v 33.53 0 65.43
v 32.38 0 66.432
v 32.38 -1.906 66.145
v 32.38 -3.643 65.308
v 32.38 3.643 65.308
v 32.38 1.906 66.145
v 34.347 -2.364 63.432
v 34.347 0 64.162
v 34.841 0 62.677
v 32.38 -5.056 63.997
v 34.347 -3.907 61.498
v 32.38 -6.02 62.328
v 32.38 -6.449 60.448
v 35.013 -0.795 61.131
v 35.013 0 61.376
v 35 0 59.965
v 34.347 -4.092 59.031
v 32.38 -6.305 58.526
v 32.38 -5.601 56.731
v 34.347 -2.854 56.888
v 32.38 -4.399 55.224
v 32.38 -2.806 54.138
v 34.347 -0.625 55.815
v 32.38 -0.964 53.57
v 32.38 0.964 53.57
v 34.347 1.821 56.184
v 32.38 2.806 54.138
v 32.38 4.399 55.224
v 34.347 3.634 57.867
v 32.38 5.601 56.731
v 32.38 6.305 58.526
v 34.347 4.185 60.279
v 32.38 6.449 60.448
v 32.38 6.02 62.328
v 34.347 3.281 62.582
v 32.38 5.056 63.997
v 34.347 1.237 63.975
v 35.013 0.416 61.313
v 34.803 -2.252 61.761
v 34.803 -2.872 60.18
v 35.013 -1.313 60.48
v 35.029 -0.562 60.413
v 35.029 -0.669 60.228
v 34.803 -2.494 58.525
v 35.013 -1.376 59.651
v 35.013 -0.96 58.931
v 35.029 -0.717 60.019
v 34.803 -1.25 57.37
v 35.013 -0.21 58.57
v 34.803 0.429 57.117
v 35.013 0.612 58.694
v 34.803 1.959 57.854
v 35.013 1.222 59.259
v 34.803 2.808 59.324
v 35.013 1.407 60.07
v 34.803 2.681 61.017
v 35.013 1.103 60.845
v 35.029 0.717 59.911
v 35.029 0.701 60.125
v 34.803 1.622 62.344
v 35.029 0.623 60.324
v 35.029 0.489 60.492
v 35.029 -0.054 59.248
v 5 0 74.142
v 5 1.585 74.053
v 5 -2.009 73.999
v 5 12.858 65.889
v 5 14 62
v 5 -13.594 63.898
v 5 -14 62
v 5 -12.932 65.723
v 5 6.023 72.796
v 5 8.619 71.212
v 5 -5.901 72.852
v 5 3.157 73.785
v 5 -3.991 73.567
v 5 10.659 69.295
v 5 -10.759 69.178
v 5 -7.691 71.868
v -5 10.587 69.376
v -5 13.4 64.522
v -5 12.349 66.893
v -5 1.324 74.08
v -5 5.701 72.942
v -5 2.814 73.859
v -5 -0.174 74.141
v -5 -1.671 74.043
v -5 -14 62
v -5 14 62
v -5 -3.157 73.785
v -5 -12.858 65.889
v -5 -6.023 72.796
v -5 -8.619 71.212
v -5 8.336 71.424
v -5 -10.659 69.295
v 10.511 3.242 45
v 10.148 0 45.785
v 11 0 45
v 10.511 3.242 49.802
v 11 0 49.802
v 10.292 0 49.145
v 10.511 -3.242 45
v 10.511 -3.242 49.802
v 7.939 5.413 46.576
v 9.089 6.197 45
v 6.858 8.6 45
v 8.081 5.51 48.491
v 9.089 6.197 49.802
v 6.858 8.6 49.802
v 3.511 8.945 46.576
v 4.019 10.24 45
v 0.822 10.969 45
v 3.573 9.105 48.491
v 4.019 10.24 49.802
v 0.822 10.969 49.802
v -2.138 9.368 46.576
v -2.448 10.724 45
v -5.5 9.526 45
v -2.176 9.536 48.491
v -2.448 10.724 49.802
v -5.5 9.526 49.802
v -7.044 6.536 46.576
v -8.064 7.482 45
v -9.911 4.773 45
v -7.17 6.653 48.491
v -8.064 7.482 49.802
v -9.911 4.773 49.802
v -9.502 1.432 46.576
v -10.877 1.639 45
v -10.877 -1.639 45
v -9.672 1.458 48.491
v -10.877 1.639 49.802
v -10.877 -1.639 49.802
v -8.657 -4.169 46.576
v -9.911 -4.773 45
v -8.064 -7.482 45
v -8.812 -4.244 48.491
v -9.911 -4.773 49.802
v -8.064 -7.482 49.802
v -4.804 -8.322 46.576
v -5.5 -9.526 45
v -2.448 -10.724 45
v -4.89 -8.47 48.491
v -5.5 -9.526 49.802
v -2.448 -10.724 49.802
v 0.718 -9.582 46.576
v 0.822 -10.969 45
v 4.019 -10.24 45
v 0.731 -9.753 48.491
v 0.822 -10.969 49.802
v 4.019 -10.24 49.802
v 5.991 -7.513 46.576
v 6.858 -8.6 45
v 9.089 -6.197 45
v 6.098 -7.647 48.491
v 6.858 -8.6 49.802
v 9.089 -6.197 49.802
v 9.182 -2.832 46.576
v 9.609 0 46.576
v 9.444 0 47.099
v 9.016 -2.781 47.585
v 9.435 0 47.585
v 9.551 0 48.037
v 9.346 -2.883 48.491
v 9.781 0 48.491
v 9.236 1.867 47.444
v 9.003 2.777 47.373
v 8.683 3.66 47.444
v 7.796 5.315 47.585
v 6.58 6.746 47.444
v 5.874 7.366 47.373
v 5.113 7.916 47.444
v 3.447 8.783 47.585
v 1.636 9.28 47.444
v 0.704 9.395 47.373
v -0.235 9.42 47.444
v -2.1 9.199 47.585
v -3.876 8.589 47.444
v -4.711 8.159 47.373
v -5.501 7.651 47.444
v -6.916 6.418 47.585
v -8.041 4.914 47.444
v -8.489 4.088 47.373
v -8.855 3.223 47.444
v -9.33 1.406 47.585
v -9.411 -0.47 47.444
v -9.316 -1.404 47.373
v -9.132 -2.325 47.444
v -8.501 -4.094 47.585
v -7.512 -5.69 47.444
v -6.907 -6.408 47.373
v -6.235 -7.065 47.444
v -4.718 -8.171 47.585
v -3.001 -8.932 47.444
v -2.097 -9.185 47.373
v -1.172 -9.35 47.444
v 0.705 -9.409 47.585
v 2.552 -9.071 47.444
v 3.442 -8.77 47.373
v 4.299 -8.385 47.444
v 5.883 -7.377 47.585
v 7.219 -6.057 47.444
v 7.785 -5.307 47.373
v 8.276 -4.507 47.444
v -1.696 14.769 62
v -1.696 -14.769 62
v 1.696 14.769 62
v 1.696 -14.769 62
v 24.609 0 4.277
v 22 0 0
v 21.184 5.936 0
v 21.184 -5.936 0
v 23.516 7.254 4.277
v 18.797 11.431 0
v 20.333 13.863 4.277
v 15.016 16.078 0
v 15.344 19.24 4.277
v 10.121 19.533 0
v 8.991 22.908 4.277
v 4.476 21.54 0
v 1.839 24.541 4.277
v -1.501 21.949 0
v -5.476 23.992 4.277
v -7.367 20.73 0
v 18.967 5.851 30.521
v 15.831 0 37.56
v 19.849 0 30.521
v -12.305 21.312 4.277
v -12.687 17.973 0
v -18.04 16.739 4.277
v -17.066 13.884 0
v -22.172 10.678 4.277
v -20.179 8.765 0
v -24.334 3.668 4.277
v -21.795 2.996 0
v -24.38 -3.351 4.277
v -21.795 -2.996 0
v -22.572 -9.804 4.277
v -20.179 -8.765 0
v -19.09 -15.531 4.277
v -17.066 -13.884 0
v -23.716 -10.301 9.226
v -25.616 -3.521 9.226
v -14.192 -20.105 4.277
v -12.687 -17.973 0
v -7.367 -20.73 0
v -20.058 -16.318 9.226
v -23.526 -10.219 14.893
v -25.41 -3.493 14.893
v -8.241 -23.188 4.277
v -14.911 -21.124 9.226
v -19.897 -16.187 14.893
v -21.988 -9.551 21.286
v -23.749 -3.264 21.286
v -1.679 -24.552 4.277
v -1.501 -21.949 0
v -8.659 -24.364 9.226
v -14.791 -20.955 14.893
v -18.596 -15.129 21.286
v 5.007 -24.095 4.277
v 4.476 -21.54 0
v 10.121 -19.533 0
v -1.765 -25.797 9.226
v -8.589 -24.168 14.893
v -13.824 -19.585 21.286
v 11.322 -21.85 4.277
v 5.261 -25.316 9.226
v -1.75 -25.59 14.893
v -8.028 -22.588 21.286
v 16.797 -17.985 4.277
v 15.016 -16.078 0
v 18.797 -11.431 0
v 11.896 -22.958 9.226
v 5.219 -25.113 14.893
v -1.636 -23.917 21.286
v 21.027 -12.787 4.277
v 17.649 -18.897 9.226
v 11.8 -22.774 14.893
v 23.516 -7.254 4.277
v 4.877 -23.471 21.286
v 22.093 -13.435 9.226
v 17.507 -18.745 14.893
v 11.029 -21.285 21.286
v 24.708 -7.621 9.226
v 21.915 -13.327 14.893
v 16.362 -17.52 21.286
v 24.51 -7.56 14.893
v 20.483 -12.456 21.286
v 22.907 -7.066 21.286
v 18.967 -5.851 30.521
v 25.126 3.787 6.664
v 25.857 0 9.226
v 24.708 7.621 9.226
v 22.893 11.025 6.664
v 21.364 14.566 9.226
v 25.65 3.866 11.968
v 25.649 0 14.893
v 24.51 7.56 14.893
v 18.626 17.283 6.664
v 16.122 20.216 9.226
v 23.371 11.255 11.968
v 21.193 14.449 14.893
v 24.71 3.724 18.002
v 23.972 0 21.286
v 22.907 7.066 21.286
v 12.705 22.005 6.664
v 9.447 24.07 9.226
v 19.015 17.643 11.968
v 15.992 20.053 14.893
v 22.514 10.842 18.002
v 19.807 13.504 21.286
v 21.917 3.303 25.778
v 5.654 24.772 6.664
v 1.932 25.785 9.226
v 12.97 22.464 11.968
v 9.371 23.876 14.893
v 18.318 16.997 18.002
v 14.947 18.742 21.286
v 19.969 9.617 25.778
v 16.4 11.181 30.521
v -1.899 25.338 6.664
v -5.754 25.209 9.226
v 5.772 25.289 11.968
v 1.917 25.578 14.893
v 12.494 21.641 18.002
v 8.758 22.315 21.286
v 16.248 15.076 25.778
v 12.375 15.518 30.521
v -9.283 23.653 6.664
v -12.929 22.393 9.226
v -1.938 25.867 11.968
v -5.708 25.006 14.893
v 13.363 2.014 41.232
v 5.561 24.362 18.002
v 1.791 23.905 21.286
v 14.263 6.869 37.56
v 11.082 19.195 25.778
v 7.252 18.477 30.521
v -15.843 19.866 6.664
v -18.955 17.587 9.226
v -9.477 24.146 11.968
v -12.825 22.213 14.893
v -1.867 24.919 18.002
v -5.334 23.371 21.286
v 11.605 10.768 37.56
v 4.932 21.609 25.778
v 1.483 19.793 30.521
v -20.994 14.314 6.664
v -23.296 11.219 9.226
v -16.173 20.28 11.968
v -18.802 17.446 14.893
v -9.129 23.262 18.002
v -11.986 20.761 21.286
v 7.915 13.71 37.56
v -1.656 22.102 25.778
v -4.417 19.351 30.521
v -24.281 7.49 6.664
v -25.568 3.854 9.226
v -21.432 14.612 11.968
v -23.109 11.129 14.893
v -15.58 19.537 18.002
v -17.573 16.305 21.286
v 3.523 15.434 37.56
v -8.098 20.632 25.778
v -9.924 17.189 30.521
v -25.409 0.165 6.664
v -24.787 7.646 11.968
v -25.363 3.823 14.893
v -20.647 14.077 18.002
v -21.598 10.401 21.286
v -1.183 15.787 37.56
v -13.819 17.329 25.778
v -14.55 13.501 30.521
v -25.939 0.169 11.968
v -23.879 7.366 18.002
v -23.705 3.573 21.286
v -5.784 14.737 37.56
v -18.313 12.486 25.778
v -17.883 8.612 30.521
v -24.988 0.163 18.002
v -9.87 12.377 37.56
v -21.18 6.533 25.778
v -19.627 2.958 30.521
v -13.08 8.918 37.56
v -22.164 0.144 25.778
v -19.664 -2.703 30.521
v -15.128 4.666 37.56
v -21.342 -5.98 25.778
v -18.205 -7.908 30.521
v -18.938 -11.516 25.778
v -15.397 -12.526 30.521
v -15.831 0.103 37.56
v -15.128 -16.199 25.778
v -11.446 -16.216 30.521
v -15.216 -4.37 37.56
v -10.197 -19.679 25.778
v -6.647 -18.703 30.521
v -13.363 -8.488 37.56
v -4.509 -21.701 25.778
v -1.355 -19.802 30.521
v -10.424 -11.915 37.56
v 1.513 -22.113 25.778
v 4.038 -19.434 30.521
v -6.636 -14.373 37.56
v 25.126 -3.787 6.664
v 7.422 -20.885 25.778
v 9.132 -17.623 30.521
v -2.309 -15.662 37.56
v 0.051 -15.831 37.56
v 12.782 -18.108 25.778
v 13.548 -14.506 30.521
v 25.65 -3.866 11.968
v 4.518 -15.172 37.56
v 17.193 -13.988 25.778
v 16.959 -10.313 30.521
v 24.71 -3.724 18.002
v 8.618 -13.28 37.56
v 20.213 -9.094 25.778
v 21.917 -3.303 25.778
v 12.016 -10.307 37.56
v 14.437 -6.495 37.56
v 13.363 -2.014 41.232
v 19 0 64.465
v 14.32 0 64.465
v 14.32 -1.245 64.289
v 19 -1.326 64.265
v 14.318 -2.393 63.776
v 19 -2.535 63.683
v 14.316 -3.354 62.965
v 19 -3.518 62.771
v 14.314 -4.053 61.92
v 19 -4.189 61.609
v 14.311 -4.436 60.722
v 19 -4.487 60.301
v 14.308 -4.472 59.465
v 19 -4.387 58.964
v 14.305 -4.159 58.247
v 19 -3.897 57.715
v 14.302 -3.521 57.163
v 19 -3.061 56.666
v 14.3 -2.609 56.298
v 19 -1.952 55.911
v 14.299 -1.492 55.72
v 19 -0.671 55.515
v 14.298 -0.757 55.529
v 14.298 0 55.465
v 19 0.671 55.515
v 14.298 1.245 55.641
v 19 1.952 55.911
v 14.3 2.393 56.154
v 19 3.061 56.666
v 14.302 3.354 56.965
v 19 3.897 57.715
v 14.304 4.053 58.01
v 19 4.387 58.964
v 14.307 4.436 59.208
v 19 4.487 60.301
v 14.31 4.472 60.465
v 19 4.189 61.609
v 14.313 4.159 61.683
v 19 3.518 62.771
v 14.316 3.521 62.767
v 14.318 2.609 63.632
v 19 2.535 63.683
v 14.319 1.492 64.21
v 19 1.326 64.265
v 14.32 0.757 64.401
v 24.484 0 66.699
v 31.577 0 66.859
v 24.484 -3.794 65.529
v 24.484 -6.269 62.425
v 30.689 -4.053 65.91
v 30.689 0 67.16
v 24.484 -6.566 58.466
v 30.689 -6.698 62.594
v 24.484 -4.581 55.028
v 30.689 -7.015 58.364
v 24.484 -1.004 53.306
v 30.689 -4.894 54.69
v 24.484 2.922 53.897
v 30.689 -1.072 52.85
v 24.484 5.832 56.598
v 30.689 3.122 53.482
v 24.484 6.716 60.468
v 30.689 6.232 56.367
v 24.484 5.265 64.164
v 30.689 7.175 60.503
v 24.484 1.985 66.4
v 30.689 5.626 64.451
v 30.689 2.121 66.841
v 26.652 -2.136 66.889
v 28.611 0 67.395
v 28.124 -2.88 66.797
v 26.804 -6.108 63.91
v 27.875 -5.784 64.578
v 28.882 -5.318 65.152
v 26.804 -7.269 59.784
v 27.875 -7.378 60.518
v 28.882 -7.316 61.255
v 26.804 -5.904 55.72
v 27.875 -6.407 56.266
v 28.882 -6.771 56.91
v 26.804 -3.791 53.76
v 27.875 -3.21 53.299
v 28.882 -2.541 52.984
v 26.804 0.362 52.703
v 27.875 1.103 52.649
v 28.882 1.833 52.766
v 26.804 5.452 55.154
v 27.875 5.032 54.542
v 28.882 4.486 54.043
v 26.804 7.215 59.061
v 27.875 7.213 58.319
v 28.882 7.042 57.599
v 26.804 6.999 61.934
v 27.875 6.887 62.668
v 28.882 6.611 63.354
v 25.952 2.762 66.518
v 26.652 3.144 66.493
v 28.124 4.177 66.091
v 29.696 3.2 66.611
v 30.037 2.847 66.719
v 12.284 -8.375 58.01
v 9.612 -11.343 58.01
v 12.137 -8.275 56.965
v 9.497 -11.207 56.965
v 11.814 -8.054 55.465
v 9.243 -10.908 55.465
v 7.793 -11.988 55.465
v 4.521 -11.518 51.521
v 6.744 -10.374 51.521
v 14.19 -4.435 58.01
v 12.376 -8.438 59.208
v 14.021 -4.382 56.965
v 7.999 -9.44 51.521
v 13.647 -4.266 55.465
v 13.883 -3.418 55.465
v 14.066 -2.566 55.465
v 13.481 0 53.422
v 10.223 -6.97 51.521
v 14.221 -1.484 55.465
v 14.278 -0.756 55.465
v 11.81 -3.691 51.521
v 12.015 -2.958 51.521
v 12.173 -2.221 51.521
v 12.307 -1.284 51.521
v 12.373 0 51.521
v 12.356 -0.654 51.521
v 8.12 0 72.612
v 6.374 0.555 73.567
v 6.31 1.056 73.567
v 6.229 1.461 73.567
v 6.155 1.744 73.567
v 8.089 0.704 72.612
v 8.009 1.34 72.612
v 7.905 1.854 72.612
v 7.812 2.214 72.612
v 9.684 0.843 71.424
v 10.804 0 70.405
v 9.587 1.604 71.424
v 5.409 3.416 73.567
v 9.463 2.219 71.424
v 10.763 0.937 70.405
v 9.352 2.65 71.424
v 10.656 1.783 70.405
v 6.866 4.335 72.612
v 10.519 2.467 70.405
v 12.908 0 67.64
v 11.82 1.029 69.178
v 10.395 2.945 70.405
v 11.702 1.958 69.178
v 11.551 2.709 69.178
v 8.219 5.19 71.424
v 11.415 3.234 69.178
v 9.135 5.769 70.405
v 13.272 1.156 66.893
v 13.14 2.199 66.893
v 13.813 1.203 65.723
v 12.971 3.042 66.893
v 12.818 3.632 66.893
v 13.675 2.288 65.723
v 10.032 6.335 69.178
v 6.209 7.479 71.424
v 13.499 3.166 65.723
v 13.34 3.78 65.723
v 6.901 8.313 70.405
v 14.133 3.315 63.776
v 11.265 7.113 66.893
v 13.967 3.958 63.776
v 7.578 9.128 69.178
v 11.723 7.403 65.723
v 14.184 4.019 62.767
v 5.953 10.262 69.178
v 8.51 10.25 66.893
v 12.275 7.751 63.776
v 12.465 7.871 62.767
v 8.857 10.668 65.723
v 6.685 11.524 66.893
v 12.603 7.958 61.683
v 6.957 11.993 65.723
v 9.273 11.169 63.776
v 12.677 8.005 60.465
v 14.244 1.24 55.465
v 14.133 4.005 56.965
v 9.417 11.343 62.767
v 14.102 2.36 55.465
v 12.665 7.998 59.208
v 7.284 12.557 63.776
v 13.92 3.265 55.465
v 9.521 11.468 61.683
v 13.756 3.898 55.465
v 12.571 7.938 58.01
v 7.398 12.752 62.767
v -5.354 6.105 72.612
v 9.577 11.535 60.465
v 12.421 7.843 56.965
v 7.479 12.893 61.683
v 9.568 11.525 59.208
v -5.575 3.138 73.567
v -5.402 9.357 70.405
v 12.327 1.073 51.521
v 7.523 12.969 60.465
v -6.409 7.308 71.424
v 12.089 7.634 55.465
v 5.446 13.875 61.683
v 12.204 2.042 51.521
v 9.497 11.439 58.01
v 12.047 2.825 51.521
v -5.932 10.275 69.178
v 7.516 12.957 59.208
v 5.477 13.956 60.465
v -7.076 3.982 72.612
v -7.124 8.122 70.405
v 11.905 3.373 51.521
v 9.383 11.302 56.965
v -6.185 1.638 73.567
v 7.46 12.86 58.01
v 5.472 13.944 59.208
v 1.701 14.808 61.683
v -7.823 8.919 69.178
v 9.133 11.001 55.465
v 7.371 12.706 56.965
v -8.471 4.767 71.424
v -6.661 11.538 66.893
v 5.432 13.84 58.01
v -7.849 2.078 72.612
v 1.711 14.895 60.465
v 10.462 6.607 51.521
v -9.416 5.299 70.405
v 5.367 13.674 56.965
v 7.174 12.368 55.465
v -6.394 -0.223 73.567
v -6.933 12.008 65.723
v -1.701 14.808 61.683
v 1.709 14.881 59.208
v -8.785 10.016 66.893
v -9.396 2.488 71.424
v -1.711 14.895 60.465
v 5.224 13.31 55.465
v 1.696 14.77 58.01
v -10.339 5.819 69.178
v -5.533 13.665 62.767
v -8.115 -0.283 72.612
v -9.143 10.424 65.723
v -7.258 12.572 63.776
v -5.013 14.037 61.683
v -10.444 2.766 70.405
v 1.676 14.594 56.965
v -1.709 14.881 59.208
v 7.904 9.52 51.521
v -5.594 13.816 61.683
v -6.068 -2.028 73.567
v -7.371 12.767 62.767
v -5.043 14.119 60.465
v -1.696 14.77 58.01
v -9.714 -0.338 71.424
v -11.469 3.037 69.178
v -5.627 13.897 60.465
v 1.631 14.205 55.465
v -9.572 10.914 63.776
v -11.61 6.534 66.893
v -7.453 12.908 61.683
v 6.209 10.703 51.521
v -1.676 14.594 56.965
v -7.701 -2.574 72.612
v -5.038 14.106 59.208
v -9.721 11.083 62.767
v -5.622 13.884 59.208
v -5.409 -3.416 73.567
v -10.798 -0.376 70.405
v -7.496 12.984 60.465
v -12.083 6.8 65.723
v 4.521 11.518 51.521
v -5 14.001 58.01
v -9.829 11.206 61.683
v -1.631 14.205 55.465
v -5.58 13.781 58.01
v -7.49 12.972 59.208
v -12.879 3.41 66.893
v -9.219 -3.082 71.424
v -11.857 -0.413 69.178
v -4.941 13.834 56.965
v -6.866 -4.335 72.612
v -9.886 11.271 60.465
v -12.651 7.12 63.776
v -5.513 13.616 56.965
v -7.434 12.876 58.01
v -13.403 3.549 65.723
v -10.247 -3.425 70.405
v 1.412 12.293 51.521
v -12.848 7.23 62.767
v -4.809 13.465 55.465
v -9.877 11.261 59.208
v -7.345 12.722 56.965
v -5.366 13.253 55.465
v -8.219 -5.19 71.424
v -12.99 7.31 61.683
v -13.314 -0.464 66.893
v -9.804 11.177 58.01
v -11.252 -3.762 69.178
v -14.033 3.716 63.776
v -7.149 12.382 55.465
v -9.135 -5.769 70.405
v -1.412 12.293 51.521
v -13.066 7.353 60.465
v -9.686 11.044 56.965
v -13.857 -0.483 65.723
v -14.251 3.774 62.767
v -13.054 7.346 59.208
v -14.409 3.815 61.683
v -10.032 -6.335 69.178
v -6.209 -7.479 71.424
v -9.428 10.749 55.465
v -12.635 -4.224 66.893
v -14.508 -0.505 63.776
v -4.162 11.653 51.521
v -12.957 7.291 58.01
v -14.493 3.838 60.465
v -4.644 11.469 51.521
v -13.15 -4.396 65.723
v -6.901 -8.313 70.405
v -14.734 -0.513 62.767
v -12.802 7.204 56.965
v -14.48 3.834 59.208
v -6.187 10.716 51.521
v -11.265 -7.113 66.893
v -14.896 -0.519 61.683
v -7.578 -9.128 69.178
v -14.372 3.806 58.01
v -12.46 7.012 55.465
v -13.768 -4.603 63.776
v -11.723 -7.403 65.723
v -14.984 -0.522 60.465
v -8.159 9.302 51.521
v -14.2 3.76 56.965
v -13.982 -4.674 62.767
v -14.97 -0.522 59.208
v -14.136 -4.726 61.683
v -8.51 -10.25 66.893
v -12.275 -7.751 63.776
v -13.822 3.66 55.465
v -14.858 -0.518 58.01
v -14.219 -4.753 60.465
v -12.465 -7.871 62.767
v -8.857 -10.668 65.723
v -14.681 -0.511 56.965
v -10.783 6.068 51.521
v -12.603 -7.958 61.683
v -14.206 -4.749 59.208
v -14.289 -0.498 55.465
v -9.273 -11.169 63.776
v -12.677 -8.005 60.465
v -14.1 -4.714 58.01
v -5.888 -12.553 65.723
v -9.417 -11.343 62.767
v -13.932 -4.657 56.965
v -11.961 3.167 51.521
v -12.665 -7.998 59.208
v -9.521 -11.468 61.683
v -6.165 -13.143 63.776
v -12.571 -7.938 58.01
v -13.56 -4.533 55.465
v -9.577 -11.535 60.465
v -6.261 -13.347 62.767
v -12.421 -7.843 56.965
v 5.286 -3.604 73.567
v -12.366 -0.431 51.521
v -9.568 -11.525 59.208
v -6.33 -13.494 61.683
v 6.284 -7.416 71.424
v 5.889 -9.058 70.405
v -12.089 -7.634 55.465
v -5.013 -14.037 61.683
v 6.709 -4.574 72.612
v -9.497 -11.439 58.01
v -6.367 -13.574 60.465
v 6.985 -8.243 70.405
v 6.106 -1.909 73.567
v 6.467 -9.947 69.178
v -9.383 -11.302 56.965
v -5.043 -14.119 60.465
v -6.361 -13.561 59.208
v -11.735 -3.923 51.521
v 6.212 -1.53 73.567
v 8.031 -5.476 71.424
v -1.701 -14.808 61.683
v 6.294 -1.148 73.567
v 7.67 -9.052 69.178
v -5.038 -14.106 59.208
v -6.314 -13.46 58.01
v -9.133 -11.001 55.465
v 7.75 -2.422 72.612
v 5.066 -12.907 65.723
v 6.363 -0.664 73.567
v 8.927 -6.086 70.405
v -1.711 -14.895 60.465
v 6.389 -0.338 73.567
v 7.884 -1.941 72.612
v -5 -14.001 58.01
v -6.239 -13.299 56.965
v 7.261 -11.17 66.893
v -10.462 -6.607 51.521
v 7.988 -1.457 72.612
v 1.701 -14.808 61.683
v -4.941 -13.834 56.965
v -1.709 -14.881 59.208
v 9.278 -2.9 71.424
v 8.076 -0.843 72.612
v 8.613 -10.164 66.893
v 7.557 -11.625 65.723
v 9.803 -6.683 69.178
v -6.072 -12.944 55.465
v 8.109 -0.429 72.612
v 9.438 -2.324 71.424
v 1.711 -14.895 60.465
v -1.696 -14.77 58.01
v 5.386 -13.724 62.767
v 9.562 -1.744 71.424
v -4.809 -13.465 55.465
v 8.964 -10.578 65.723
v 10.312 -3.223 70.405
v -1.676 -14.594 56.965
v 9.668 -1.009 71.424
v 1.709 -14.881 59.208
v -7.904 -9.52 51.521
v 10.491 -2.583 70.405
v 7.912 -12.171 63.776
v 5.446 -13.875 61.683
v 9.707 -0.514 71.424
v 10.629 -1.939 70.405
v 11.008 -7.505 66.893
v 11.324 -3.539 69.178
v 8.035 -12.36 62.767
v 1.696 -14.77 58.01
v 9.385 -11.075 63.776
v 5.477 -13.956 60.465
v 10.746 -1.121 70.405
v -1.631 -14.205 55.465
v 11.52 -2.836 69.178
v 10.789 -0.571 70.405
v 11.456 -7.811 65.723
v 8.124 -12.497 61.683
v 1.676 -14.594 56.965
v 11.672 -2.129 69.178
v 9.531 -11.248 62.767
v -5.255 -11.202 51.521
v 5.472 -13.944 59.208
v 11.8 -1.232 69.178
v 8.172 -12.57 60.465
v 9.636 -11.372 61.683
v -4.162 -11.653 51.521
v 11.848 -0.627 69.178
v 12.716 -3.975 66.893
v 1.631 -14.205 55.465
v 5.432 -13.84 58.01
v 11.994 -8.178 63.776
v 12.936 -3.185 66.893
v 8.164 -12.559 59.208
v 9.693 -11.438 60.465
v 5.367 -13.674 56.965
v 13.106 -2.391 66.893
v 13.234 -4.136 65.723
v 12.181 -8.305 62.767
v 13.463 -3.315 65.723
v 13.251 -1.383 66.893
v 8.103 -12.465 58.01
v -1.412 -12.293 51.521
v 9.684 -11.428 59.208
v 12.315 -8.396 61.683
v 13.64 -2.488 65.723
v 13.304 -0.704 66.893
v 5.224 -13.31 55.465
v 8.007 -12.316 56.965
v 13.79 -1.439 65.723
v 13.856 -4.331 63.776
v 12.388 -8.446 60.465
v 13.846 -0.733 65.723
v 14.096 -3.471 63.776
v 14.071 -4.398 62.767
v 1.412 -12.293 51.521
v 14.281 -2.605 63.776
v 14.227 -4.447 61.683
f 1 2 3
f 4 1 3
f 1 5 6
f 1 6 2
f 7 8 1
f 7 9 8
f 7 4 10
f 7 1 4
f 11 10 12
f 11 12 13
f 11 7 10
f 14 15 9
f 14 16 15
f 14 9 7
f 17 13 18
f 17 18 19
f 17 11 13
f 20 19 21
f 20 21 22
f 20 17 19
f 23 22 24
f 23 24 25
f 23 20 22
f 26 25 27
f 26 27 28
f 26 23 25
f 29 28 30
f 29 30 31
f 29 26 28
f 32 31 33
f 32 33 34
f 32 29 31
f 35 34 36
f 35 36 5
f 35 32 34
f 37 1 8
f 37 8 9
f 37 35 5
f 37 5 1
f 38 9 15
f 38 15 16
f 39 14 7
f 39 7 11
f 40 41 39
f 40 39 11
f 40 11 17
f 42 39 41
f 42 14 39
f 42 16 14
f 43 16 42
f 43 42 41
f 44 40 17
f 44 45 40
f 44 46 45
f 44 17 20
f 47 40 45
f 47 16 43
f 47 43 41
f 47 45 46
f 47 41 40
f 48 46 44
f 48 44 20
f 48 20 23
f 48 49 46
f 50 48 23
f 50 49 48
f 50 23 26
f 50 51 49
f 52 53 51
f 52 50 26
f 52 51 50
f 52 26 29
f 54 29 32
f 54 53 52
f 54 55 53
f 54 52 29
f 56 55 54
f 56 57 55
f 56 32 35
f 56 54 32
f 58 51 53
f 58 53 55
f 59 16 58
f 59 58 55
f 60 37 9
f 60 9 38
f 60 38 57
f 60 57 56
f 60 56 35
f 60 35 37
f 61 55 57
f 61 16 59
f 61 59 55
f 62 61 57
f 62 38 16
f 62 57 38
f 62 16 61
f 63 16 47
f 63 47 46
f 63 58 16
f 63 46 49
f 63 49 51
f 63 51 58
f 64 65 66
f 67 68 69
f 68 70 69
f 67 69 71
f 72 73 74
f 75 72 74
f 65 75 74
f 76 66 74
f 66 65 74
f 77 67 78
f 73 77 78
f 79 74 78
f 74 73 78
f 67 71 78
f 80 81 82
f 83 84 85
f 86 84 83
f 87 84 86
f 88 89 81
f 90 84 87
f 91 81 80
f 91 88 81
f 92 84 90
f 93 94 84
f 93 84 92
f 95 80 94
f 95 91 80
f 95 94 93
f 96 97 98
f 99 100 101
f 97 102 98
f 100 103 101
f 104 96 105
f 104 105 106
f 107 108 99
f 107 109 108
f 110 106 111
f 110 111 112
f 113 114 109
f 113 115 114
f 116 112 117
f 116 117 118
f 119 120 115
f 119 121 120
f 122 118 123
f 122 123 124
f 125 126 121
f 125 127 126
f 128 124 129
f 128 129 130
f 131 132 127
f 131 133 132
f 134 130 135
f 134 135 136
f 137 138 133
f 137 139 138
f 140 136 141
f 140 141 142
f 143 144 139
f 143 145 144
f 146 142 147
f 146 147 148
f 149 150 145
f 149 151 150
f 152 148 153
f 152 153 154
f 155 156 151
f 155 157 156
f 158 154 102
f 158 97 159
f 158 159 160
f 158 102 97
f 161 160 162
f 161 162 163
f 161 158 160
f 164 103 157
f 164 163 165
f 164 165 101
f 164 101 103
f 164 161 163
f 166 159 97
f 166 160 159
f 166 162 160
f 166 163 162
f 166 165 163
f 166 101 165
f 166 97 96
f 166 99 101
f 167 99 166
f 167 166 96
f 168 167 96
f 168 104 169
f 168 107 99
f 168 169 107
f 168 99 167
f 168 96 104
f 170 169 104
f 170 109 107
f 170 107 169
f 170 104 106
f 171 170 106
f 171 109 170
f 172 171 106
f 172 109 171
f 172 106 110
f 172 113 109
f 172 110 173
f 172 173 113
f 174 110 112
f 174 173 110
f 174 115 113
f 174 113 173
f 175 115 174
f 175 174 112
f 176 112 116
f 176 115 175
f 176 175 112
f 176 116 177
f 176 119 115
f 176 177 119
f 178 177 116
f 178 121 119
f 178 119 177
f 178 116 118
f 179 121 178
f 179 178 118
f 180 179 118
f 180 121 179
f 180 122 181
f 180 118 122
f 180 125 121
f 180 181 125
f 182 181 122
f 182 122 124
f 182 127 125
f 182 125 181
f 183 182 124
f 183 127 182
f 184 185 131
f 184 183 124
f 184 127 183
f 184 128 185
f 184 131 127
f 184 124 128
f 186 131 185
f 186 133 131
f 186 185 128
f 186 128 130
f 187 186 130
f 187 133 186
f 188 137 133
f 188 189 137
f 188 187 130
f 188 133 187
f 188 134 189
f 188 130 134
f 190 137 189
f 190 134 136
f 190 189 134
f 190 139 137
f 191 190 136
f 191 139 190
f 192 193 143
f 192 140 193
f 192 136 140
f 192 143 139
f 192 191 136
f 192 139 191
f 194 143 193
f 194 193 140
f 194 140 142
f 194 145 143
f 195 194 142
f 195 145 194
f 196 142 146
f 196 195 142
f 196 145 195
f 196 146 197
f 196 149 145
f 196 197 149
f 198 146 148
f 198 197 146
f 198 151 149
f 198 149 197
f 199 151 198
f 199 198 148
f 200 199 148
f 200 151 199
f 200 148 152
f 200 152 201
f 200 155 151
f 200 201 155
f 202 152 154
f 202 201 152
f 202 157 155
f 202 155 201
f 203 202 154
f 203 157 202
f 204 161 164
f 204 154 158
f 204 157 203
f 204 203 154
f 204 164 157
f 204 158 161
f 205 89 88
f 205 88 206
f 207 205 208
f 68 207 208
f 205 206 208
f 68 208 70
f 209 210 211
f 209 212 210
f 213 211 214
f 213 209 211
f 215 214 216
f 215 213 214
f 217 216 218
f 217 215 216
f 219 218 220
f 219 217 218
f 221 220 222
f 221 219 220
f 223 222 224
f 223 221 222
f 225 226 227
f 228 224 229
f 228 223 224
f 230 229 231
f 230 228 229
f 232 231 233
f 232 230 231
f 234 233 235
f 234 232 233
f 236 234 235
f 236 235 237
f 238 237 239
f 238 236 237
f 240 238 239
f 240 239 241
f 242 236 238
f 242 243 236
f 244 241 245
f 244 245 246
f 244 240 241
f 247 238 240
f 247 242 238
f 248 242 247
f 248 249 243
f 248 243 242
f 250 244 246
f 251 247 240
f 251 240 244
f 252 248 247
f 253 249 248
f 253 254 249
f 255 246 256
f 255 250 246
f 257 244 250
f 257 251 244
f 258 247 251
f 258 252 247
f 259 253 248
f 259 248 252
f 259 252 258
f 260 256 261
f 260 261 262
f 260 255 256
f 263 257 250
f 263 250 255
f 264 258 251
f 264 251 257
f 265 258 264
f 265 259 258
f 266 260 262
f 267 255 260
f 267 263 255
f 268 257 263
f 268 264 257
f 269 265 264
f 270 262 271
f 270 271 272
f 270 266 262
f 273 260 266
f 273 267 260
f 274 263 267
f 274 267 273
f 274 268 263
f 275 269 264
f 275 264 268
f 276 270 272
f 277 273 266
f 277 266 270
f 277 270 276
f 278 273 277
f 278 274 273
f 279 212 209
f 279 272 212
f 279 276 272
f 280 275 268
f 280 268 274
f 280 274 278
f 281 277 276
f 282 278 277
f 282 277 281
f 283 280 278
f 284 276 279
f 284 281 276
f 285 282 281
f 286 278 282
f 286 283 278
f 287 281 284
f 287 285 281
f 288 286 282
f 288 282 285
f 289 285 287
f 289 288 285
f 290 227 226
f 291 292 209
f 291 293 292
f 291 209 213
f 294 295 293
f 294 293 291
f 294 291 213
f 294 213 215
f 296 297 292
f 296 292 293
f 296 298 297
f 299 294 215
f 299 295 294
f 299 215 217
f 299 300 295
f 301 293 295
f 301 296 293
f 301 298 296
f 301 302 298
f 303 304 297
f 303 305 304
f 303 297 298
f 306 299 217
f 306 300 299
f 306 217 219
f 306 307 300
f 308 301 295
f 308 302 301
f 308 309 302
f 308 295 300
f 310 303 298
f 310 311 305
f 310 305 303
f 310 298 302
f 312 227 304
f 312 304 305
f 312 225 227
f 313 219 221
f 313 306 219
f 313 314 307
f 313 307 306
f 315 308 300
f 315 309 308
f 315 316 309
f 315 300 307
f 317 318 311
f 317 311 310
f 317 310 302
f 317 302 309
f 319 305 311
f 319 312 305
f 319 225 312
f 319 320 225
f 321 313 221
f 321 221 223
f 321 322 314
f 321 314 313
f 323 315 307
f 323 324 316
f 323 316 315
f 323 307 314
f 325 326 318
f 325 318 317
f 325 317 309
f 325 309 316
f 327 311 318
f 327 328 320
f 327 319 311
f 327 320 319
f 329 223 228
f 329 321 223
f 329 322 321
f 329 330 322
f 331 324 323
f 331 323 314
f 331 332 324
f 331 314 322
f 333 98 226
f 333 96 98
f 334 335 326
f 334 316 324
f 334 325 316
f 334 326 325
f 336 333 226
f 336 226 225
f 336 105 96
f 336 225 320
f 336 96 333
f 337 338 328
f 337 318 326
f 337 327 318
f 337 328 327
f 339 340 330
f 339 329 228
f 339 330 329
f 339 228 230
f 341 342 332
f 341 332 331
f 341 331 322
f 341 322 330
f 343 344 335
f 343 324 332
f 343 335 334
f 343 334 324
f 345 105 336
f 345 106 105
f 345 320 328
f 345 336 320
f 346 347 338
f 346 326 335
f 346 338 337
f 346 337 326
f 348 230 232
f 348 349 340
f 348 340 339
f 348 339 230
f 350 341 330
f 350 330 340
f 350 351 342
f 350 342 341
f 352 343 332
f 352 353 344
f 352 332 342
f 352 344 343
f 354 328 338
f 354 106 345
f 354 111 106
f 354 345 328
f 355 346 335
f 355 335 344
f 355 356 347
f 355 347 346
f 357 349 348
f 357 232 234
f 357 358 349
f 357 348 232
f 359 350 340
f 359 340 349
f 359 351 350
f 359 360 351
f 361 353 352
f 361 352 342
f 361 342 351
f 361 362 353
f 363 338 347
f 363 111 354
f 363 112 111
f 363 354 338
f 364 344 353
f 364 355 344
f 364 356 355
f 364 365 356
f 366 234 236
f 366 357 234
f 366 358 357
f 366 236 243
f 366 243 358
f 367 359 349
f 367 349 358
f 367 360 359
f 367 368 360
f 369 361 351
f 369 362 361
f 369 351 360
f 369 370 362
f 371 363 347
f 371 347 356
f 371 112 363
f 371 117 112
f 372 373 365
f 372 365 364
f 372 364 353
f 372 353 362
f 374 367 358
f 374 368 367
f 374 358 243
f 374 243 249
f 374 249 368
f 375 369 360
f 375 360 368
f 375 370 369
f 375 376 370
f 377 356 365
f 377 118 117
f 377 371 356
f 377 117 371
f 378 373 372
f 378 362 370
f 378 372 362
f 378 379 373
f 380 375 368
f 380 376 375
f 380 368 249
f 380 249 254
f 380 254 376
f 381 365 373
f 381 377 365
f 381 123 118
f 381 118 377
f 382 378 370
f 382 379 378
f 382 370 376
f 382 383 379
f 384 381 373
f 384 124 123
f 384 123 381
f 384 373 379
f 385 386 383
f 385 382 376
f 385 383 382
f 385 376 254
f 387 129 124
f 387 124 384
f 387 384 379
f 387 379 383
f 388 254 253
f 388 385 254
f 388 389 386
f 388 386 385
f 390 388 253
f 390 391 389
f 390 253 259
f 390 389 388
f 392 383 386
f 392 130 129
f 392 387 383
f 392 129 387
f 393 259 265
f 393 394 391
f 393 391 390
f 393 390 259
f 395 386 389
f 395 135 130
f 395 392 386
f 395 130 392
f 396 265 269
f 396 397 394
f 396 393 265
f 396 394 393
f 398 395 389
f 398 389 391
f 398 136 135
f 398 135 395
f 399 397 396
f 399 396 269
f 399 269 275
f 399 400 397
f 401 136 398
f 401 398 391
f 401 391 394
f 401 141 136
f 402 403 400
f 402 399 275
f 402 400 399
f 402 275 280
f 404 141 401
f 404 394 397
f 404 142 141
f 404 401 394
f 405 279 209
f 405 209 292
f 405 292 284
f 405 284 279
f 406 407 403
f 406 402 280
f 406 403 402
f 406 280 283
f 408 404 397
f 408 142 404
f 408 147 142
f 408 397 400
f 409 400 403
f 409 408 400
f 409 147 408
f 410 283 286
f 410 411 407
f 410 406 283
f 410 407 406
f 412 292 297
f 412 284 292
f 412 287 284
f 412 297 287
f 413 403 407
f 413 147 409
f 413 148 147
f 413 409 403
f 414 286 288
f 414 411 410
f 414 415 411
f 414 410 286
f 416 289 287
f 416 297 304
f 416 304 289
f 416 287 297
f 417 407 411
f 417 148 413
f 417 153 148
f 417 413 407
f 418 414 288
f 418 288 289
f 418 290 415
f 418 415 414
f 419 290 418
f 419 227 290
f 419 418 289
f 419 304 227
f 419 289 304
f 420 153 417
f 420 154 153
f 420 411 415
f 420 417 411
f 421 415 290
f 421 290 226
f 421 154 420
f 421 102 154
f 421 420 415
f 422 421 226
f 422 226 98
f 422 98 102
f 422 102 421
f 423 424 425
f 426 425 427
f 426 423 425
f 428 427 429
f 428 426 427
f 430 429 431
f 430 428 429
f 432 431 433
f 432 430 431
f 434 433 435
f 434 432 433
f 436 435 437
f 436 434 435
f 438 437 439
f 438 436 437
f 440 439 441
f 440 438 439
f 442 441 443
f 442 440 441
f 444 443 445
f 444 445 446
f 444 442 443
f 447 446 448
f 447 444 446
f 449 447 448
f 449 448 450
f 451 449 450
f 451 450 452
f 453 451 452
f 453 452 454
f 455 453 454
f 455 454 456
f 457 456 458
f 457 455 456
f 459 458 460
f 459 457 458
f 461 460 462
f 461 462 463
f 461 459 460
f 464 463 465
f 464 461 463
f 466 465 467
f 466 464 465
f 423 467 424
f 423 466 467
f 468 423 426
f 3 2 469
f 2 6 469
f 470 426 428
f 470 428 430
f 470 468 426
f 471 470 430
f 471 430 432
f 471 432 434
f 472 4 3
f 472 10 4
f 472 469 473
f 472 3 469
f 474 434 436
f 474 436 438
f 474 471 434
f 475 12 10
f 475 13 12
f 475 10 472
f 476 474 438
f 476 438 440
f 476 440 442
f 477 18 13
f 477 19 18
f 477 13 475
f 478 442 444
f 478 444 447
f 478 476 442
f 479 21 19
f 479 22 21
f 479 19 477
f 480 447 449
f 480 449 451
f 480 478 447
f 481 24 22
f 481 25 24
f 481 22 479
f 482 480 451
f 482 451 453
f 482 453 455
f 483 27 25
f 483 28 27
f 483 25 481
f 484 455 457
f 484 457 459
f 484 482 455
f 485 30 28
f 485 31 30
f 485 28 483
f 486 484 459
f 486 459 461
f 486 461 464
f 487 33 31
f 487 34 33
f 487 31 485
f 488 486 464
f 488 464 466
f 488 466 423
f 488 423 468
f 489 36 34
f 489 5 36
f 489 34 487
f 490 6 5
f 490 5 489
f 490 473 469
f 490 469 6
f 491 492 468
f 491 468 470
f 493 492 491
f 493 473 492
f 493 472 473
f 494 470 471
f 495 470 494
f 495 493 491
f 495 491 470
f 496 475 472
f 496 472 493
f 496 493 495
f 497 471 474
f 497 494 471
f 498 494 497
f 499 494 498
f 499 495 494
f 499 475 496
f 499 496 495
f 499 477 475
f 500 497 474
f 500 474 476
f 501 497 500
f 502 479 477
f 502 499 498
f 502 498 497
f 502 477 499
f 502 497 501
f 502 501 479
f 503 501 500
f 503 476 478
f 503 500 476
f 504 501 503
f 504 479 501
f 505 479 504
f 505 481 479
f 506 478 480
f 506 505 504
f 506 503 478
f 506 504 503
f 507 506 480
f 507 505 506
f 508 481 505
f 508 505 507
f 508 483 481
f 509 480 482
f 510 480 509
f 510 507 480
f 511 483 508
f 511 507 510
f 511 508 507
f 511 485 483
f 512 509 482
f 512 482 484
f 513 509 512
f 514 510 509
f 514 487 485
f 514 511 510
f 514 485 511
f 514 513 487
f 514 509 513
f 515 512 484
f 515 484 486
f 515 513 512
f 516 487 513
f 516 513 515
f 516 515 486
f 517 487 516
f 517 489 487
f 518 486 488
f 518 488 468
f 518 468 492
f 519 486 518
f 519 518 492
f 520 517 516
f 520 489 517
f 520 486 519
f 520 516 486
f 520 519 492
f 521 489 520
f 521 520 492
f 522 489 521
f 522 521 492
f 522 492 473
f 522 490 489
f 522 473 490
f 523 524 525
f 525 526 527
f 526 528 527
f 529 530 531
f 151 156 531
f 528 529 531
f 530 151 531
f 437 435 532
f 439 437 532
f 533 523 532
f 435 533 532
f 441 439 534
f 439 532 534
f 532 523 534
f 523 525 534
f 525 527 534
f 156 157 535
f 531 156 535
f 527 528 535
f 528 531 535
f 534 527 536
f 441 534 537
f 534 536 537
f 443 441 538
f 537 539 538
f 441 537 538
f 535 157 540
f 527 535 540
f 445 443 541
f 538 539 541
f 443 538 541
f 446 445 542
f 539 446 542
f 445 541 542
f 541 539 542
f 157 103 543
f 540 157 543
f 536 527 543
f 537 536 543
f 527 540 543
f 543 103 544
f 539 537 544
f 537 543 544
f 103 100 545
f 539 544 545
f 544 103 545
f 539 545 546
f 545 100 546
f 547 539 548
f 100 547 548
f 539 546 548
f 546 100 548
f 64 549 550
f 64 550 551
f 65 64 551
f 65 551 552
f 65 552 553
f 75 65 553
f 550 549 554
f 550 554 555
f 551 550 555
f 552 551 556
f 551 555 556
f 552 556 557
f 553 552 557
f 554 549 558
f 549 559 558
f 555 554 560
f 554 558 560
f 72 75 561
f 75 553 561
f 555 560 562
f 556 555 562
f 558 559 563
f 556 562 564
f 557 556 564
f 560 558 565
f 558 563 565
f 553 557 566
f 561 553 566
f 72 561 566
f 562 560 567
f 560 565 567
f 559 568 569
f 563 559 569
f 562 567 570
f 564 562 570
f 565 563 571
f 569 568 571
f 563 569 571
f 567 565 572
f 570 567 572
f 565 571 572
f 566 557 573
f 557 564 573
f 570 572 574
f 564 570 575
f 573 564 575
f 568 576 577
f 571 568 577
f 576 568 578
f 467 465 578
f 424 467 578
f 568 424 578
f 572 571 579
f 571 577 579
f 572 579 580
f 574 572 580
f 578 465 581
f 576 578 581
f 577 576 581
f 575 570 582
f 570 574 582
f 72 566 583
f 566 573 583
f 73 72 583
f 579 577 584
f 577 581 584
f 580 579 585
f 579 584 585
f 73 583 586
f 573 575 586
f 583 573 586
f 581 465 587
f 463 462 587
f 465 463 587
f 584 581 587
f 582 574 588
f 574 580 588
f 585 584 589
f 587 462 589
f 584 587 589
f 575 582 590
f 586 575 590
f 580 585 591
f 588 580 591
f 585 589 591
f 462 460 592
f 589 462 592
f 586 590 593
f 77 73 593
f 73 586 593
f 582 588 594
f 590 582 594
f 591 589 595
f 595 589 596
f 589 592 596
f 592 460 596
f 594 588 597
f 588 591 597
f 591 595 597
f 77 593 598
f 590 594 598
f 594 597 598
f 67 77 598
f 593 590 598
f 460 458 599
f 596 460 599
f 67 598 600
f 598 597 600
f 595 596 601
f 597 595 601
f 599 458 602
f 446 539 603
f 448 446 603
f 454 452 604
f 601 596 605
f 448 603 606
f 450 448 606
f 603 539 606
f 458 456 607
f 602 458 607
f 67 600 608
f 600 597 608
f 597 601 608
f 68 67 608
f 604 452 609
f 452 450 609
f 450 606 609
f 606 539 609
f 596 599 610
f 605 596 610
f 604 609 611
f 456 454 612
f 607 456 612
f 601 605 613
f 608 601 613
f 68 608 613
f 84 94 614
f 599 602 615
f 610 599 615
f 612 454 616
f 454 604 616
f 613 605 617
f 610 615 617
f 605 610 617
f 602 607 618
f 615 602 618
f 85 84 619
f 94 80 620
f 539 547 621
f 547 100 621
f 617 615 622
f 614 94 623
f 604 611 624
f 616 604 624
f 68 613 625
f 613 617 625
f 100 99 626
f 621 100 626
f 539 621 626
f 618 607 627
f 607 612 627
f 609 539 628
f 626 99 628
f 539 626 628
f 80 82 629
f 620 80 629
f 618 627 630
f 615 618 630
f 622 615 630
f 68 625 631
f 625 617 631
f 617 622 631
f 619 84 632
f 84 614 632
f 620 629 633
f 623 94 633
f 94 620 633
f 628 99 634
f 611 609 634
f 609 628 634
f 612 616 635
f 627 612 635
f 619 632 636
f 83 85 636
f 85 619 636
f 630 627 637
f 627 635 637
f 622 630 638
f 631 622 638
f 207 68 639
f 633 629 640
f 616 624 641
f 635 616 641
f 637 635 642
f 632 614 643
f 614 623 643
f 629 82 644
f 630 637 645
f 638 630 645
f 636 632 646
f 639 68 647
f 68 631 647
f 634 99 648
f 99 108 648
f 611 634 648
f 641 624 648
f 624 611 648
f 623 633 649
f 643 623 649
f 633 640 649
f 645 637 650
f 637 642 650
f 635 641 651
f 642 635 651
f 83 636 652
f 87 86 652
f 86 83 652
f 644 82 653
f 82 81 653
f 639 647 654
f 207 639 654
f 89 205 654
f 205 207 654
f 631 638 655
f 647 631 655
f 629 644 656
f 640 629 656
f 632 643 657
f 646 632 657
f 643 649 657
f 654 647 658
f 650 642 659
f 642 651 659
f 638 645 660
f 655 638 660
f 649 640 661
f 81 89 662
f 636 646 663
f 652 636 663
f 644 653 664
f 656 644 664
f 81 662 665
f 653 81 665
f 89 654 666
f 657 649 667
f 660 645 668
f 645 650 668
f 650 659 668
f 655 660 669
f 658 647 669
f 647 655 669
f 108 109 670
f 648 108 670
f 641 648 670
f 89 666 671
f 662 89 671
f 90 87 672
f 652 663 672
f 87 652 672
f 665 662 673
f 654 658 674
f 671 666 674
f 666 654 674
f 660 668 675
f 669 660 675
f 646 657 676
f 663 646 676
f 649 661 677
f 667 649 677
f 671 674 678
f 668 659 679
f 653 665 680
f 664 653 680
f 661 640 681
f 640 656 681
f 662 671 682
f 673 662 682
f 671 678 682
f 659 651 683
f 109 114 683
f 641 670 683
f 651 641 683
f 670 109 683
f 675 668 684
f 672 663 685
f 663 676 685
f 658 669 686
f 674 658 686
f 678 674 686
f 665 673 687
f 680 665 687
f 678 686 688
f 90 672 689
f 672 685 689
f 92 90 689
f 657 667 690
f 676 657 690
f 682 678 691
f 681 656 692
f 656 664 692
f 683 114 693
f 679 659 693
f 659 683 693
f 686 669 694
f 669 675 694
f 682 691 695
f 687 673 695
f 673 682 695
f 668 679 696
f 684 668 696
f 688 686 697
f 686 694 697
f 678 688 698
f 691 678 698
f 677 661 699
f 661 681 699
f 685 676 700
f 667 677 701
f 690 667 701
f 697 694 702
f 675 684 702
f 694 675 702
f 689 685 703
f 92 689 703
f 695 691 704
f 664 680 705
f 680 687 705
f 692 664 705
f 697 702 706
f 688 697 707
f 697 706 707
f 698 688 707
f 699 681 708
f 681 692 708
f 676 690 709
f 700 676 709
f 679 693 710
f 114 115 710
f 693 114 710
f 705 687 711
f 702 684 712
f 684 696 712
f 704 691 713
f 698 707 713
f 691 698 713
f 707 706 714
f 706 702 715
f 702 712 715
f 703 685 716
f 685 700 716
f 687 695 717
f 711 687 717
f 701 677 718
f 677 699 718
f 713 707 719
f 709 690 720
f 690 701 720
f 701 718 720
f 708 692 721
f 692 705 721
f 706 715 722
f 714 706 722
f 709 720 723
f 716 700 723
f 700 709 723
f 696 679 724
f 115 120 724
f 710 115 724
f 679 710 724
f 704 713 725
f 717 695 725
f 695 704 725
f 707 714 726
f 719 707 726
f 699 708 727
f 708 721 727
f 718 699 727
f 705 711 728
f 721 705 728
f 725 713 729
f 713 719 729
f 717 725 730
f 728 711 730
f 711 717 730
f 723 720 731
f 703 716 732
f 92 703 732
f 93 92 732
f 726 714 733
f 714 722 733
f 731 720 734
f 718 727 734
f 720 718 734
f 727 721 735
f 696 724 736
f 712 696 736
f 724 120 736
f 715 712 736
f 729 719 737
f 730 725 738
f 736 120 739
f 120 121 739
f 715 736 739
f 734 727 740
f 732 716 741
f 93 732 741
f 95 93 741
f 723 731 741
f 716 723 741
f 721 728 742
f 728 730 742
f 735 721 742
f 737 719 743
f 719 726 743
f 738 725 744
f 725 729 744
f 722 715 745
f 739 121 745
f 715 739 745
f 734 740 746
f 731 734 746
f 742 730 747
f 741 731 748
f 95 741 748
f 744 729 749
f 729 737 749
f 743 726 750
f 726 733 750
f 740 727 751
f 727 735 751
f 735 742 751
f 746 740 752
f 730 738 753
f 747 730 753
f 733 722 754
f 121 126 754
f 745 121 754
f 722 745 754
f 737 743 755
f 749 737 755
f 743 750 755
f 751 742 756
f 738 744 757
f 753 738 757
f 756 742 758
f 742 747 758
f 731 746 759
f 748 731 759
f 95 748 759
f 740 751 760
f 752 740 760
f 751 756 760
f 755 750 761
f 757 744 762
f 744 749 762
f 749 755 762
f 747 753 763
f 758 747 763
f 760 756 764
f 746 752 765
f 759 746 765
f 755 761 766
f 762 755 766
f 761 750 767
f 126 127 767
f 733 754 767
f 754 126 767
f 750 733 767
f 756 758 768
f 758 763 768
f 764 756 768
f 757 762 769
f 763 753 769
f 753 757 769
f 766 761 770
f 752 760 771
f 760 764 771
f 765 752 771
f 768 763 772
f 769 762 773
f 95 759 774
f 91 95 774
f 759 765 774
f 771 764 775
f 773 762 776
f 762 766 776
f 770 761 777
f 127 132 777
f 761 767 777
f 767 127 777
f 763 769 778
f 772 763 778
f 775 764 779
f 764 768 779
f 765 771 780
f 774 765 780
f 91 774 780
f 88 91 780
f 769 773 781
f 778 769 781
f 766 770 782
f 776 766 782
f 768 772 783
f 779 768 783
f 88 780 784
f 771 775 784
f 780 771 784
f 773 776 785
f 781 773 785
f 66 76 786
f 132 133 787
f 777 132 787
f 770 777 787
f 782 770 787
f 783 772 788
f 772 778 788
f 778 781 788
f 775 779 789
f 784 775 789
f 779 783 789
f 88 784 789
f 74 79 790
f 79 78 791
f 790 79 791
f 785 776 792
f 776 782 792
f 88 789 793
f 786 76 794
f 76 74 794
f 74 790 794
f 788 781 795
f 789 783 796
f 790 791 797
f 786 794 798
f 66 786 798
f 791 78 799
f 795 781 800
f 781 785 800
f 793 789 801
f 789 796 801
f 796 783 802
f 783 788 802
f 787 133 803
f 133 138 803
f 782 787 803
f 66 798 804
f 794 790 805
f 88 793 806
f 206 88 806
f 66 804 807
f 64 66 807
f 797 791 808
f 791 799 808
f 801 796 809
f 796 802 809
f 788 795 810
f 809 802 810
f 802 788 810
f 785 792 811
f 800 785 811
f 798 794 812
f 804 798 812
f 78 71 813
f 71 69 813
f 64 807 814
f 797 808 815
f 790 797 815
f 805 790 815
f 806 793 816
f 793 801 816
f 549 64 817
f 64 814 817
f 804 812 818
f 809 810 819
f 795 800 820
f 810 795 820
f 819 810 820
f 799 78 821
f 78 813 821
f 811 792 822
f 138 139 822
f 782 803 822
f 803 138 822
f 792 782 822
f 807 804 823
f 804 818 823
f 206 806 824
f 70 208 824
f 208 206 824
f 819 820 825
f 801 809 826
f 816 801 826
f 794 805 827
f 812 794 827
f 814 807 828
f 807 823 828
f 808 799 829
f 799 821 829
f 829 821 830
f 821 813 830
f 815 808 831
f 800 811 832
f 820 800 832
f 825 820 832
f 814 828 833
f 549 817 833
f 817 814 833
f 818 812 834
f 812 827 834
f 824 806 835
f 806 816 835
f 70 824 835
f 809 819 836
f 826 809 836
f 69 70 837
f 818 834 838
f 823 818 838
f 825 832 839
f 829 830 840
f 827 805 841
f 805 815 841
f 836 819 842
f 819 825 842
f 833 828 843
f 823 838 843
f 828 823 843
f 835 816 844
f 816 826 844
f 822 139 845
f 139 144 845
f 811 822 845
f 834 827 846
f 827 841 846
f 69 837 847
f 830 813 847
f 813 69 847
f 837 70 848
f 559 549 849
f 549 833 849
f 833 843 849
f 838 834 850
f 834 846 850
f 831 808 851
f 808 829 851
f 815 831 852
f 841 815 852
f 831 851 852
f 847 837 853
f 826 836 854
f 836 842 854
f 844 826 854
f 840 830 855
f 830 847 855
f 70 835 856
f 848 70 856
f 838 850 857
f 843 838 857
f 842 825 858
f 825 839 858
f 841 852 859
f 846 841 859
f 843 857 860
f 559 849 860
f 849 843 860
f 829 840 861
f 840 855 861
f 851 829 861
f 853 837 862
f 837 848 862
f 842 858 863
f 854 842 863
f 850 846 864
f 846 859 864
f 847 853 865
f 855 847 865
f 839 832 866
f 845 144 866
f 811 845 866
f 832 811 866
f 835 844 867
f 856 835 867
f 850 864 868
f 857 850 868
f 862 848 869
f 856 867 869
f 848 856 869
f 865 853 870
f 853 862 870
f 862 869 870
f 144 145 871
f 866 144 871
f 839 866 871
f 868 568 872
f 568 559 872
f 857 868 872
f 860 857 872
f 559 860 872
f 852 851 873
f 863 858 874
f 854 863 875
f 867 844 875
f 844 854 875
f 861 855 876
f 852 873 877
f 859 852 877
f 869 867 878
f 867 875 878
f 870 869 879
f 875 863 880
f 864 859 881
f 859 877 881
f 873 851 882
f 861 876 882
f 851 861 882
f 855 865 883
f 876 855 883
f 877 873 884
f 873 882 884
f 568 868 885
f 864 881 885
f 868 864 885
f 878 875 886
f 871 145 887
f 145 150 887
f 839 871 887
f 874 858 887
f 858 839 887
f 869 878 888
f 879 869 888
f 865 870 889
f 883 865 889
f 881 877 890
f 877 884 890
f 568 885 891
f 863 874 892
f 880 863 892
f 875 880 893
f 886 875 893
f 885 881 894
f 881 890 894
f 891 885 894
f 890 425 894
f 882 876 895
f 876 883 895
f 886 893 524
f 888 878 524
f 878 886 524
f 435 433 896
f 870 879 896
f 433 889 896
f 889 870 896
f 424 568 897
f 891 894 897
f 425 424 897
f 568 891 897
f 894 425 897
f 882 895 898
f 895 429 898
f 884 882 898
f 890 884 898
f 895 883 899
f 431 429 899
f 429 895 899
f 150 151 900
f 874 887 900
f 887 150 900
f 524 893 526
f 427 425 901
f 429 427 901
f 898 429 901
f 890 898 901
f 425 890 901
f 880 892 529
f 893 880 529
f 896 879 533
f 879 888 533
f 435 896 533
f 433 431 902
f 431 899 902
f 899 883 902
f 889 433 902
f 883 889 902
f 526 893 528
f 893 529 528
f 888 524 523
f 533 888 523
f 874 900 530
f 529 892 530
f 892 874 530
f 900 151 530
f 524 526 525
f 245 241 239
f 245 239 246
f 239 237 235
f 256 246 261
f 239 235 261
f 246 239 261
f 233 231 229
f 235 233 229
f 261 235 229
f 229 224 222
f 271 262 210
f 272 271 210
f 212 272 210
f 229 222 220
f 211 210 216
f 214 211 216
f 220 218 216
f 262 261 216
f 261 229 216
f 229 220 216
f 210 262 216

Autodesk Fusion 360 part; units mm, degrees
sketch "Skizze1" plane through (0, 0, 0) normal (0, 1, 0) x (1, 0, 0)
  line L0 (0, 0) -> (22, 0)
  spline S0 degree 5 poles (22, 0) (22.4645, -0.5622) (23.3275, -1.719) (24.4243, -3.5519) (25.4847, -6.1942) (26.1022, -9.8465) (25.9707, -13.8685) (25.0735, -18.2683) (23.4553, -23.0241) (21.1859, -28.1013) (18.3376, -33.4642) (15.6429, -37.9599) (13.4046, -41.4389) (11.8174, -43.8052) (11, -45) knots 0 0 0 0 0 0 0.1 0.2 0.3 0.4 0.5 0.6 0.7 0.8 0.9 1 1 1 1 1 1
  arc A0 (0, -75) -> (11, -49.802) centre (0, -60) ccw
  spline S1 degree 5 poles (11, -45) (10.8801, -45.094) (10.6509, -45.282) (10.3385, -45.5647) (9.9859, -45.9427) (9.659, -46.4172) (9.456, -46.8939) (9.3869, -47.3729) (9.4571, -47.8543) (9.6608, -48.338) (9.9878, -48.8239) (10.34, -49.2142) (10.6517, -49.5078) (10.8804, -49.7038) (11, -49.802) knots 0 0 0 0 0 0 0.1 0.2 0.3 0.4 0.5 0.6 0.7 0.8 0.9 1 1 1 1 1 1
  line L1 (0, 0) -> (0, -75)
  point P0 (25.7936, -13.8468)
  point P1 (9.4217, -47.3642)
  dimension "d1" = 22
revolve "Drehen1" add sketch "Skizze1" angle 360 about axis through (0, 0, 0) along (0, 0, 1) makes body 1
ref_plane "Arbeitsebene1" through (0, 0, 0) normal (0.7071, -0.7071, 0) x (0.7071, 0.7071, 0)
sketch "Skizze2" plane through (0, 0, 0) normal (0, 1, 0) x (1, 0, 0)
  spline S0 degree 5 poles (22, 0) (22.4645, -0.5622) (23.3275, -1.719) (24.4243, -3.5519) (25.4847, -6.1942) (26.1022, -9.8465) (25.9707, -13.8685) (25.0735, -18.2683) (23.4553, -23.0241) (21.1859, -28.1013) (18.3376, -33.4642) (15.6429, -37.9599) (13.4046, -41.4389) (11.8174, -43.8052) (11, -45) knots 0 0 0 0 0 0 0.1 0.2 0.3 0.4 0.5 0.6 0.7 0.8 0.9 1 1 1 1 1 1
  line L0 (0, 0) -> (22, 0)
  line L1 (0, 0) -> (0, -75)
  spline S1 degree 5 poles (11, -45) (10.8801, -45.094) (10.6509, -45.282) (10.3385, -45.5647) (9.9859, -45.9427) (9.659, -46.4172) (9.456, -46.8939) (9.3869, -47.3729) (9.4571, -47.8543) (9.6608, -48.338) (9.9878, -48.8239) (10.34, -49.2142) (10.6517, -49.5078) (10.8804, -49.7038) (11, -49.802) knots 0 0 0 0 0 0 0.1 0.2 0.3 0.4 0.5 0.6 0.7 0.8 0.9 1 1 1 1 1 1
  arc A0 (0, -75) -> (11, -49.802) centre (0, -60) ccw
  line L2 (15, -59.9649) -> (35, -59.9649)
  line L3 (15, -59.9649) -> (15, -64.4649)
  line L4 (15, -64.4649) -> (19, -64.4649)
  spline S2 degree 5 poles (19, -64.4649) (19.6192, -64.7747) (20.8343, -65.355) (22.5863, -66.1077) (24.779, -66.8718) (27.2624, -67.4046) (29.4582, -67.4867) (31.3287, -67.1048) (32.8365, -66.269) (33.9539, -65.0756) (34.6877, -63.6086) (34.984, -62.2525) (35.0512, -61.1439) (35.0283, -60.3646) (35, -59.9649) knots 0 0 0 0 0 0 0.1 0.2 0.3 0.4 0.5 0.6 0.7 0.8 0.9 1 1 1 1 1 1
  line L5 (30.6767, -67.5286) -> (34.0841, -65.3354)
  point P0 (32.3804, -66.432)
  dimension "d6" = 20
  dimension "d7" = 4.5
  dimension "d8" = 4
revolve "Drehen2" add sketch "Skizze2" angle 360 about axis through (15, 0, 59.9649) along (1, 0, 0) separate body contours L2 L3 L4 S2 makes body 2
extrude "Extrusion1" add 1 faces at (15, -1.7045, 60.1589) along direction (-1, 0, 0) blind 2 on bodies 2 bodies 2 1
sketch "Skizze3" plane through (0, 0, 0) normal (0, 1, 0) x (1, 0, 0)
  spline S0 degree 5 poles (22, 0) (22.4645, -0.5622) (23.3275, -1.719) (24.4243, -3.5519) (25.4847, -6.1942) (26.1022, -9.8465) (25.9707, -13.8685) (25.0735, -18.2683) (23.4553, -23.0241) (21.1859, -28.1013) (18.3376, -33.4642) (15.6429, -37.9599) (13.4046, -41.4389) (11.8174, -43.8052) (11, -45) knots 0 0 0 0 0 0 0.1 0.2 0.3 0.4 0.5 0.6 0.7 0.8 0.9 1 1 1 1 1 1
  spline S1 degree 5 poles (11, -45) (10.8801, -45.094) (10.6509, -45.282) (10.3385, -45.5647) (9.9859, -45.9427) (9.659, -46.4172) (9.456, -46.8939) (9.3869, -47.3729) (9.4571, -47.8543) (9.6608, -48.338) (9.9878, -48.8239) (10.34, -49.2142) (10.6517, -49.5078) (10.8804, -49.7038) (11, -49.802) knots 0 0 0 0 0 0 0.1 0.2 0.3 0.4 0.5 0.6 0.7 0.8 0.9 1 1 1 1 1 1
  arc A0 (0, -75) -> (11, -49.802) centre (0, -60) ccw
  line L0 (0, 0) -> (0, -75)
  line L1 (0, 0) -> (22, 0)
  line L2 (-5, -62) -> (-5, -75)
  line L3 (5, -62) -> (5, -75)
  line L4 (-5, -75) -> (5, -75)
  line L5 (-5, -62) -> (5, -62)
  point P0 (9.4217, -47.3642)
  dimension "d15" = 13
extrude "Extrusion2" cut sketch "Skizze3" along normal through all and the other way through all contours A0 L0 L3 L5 | L0 L2 L4 L5 bodies 2
